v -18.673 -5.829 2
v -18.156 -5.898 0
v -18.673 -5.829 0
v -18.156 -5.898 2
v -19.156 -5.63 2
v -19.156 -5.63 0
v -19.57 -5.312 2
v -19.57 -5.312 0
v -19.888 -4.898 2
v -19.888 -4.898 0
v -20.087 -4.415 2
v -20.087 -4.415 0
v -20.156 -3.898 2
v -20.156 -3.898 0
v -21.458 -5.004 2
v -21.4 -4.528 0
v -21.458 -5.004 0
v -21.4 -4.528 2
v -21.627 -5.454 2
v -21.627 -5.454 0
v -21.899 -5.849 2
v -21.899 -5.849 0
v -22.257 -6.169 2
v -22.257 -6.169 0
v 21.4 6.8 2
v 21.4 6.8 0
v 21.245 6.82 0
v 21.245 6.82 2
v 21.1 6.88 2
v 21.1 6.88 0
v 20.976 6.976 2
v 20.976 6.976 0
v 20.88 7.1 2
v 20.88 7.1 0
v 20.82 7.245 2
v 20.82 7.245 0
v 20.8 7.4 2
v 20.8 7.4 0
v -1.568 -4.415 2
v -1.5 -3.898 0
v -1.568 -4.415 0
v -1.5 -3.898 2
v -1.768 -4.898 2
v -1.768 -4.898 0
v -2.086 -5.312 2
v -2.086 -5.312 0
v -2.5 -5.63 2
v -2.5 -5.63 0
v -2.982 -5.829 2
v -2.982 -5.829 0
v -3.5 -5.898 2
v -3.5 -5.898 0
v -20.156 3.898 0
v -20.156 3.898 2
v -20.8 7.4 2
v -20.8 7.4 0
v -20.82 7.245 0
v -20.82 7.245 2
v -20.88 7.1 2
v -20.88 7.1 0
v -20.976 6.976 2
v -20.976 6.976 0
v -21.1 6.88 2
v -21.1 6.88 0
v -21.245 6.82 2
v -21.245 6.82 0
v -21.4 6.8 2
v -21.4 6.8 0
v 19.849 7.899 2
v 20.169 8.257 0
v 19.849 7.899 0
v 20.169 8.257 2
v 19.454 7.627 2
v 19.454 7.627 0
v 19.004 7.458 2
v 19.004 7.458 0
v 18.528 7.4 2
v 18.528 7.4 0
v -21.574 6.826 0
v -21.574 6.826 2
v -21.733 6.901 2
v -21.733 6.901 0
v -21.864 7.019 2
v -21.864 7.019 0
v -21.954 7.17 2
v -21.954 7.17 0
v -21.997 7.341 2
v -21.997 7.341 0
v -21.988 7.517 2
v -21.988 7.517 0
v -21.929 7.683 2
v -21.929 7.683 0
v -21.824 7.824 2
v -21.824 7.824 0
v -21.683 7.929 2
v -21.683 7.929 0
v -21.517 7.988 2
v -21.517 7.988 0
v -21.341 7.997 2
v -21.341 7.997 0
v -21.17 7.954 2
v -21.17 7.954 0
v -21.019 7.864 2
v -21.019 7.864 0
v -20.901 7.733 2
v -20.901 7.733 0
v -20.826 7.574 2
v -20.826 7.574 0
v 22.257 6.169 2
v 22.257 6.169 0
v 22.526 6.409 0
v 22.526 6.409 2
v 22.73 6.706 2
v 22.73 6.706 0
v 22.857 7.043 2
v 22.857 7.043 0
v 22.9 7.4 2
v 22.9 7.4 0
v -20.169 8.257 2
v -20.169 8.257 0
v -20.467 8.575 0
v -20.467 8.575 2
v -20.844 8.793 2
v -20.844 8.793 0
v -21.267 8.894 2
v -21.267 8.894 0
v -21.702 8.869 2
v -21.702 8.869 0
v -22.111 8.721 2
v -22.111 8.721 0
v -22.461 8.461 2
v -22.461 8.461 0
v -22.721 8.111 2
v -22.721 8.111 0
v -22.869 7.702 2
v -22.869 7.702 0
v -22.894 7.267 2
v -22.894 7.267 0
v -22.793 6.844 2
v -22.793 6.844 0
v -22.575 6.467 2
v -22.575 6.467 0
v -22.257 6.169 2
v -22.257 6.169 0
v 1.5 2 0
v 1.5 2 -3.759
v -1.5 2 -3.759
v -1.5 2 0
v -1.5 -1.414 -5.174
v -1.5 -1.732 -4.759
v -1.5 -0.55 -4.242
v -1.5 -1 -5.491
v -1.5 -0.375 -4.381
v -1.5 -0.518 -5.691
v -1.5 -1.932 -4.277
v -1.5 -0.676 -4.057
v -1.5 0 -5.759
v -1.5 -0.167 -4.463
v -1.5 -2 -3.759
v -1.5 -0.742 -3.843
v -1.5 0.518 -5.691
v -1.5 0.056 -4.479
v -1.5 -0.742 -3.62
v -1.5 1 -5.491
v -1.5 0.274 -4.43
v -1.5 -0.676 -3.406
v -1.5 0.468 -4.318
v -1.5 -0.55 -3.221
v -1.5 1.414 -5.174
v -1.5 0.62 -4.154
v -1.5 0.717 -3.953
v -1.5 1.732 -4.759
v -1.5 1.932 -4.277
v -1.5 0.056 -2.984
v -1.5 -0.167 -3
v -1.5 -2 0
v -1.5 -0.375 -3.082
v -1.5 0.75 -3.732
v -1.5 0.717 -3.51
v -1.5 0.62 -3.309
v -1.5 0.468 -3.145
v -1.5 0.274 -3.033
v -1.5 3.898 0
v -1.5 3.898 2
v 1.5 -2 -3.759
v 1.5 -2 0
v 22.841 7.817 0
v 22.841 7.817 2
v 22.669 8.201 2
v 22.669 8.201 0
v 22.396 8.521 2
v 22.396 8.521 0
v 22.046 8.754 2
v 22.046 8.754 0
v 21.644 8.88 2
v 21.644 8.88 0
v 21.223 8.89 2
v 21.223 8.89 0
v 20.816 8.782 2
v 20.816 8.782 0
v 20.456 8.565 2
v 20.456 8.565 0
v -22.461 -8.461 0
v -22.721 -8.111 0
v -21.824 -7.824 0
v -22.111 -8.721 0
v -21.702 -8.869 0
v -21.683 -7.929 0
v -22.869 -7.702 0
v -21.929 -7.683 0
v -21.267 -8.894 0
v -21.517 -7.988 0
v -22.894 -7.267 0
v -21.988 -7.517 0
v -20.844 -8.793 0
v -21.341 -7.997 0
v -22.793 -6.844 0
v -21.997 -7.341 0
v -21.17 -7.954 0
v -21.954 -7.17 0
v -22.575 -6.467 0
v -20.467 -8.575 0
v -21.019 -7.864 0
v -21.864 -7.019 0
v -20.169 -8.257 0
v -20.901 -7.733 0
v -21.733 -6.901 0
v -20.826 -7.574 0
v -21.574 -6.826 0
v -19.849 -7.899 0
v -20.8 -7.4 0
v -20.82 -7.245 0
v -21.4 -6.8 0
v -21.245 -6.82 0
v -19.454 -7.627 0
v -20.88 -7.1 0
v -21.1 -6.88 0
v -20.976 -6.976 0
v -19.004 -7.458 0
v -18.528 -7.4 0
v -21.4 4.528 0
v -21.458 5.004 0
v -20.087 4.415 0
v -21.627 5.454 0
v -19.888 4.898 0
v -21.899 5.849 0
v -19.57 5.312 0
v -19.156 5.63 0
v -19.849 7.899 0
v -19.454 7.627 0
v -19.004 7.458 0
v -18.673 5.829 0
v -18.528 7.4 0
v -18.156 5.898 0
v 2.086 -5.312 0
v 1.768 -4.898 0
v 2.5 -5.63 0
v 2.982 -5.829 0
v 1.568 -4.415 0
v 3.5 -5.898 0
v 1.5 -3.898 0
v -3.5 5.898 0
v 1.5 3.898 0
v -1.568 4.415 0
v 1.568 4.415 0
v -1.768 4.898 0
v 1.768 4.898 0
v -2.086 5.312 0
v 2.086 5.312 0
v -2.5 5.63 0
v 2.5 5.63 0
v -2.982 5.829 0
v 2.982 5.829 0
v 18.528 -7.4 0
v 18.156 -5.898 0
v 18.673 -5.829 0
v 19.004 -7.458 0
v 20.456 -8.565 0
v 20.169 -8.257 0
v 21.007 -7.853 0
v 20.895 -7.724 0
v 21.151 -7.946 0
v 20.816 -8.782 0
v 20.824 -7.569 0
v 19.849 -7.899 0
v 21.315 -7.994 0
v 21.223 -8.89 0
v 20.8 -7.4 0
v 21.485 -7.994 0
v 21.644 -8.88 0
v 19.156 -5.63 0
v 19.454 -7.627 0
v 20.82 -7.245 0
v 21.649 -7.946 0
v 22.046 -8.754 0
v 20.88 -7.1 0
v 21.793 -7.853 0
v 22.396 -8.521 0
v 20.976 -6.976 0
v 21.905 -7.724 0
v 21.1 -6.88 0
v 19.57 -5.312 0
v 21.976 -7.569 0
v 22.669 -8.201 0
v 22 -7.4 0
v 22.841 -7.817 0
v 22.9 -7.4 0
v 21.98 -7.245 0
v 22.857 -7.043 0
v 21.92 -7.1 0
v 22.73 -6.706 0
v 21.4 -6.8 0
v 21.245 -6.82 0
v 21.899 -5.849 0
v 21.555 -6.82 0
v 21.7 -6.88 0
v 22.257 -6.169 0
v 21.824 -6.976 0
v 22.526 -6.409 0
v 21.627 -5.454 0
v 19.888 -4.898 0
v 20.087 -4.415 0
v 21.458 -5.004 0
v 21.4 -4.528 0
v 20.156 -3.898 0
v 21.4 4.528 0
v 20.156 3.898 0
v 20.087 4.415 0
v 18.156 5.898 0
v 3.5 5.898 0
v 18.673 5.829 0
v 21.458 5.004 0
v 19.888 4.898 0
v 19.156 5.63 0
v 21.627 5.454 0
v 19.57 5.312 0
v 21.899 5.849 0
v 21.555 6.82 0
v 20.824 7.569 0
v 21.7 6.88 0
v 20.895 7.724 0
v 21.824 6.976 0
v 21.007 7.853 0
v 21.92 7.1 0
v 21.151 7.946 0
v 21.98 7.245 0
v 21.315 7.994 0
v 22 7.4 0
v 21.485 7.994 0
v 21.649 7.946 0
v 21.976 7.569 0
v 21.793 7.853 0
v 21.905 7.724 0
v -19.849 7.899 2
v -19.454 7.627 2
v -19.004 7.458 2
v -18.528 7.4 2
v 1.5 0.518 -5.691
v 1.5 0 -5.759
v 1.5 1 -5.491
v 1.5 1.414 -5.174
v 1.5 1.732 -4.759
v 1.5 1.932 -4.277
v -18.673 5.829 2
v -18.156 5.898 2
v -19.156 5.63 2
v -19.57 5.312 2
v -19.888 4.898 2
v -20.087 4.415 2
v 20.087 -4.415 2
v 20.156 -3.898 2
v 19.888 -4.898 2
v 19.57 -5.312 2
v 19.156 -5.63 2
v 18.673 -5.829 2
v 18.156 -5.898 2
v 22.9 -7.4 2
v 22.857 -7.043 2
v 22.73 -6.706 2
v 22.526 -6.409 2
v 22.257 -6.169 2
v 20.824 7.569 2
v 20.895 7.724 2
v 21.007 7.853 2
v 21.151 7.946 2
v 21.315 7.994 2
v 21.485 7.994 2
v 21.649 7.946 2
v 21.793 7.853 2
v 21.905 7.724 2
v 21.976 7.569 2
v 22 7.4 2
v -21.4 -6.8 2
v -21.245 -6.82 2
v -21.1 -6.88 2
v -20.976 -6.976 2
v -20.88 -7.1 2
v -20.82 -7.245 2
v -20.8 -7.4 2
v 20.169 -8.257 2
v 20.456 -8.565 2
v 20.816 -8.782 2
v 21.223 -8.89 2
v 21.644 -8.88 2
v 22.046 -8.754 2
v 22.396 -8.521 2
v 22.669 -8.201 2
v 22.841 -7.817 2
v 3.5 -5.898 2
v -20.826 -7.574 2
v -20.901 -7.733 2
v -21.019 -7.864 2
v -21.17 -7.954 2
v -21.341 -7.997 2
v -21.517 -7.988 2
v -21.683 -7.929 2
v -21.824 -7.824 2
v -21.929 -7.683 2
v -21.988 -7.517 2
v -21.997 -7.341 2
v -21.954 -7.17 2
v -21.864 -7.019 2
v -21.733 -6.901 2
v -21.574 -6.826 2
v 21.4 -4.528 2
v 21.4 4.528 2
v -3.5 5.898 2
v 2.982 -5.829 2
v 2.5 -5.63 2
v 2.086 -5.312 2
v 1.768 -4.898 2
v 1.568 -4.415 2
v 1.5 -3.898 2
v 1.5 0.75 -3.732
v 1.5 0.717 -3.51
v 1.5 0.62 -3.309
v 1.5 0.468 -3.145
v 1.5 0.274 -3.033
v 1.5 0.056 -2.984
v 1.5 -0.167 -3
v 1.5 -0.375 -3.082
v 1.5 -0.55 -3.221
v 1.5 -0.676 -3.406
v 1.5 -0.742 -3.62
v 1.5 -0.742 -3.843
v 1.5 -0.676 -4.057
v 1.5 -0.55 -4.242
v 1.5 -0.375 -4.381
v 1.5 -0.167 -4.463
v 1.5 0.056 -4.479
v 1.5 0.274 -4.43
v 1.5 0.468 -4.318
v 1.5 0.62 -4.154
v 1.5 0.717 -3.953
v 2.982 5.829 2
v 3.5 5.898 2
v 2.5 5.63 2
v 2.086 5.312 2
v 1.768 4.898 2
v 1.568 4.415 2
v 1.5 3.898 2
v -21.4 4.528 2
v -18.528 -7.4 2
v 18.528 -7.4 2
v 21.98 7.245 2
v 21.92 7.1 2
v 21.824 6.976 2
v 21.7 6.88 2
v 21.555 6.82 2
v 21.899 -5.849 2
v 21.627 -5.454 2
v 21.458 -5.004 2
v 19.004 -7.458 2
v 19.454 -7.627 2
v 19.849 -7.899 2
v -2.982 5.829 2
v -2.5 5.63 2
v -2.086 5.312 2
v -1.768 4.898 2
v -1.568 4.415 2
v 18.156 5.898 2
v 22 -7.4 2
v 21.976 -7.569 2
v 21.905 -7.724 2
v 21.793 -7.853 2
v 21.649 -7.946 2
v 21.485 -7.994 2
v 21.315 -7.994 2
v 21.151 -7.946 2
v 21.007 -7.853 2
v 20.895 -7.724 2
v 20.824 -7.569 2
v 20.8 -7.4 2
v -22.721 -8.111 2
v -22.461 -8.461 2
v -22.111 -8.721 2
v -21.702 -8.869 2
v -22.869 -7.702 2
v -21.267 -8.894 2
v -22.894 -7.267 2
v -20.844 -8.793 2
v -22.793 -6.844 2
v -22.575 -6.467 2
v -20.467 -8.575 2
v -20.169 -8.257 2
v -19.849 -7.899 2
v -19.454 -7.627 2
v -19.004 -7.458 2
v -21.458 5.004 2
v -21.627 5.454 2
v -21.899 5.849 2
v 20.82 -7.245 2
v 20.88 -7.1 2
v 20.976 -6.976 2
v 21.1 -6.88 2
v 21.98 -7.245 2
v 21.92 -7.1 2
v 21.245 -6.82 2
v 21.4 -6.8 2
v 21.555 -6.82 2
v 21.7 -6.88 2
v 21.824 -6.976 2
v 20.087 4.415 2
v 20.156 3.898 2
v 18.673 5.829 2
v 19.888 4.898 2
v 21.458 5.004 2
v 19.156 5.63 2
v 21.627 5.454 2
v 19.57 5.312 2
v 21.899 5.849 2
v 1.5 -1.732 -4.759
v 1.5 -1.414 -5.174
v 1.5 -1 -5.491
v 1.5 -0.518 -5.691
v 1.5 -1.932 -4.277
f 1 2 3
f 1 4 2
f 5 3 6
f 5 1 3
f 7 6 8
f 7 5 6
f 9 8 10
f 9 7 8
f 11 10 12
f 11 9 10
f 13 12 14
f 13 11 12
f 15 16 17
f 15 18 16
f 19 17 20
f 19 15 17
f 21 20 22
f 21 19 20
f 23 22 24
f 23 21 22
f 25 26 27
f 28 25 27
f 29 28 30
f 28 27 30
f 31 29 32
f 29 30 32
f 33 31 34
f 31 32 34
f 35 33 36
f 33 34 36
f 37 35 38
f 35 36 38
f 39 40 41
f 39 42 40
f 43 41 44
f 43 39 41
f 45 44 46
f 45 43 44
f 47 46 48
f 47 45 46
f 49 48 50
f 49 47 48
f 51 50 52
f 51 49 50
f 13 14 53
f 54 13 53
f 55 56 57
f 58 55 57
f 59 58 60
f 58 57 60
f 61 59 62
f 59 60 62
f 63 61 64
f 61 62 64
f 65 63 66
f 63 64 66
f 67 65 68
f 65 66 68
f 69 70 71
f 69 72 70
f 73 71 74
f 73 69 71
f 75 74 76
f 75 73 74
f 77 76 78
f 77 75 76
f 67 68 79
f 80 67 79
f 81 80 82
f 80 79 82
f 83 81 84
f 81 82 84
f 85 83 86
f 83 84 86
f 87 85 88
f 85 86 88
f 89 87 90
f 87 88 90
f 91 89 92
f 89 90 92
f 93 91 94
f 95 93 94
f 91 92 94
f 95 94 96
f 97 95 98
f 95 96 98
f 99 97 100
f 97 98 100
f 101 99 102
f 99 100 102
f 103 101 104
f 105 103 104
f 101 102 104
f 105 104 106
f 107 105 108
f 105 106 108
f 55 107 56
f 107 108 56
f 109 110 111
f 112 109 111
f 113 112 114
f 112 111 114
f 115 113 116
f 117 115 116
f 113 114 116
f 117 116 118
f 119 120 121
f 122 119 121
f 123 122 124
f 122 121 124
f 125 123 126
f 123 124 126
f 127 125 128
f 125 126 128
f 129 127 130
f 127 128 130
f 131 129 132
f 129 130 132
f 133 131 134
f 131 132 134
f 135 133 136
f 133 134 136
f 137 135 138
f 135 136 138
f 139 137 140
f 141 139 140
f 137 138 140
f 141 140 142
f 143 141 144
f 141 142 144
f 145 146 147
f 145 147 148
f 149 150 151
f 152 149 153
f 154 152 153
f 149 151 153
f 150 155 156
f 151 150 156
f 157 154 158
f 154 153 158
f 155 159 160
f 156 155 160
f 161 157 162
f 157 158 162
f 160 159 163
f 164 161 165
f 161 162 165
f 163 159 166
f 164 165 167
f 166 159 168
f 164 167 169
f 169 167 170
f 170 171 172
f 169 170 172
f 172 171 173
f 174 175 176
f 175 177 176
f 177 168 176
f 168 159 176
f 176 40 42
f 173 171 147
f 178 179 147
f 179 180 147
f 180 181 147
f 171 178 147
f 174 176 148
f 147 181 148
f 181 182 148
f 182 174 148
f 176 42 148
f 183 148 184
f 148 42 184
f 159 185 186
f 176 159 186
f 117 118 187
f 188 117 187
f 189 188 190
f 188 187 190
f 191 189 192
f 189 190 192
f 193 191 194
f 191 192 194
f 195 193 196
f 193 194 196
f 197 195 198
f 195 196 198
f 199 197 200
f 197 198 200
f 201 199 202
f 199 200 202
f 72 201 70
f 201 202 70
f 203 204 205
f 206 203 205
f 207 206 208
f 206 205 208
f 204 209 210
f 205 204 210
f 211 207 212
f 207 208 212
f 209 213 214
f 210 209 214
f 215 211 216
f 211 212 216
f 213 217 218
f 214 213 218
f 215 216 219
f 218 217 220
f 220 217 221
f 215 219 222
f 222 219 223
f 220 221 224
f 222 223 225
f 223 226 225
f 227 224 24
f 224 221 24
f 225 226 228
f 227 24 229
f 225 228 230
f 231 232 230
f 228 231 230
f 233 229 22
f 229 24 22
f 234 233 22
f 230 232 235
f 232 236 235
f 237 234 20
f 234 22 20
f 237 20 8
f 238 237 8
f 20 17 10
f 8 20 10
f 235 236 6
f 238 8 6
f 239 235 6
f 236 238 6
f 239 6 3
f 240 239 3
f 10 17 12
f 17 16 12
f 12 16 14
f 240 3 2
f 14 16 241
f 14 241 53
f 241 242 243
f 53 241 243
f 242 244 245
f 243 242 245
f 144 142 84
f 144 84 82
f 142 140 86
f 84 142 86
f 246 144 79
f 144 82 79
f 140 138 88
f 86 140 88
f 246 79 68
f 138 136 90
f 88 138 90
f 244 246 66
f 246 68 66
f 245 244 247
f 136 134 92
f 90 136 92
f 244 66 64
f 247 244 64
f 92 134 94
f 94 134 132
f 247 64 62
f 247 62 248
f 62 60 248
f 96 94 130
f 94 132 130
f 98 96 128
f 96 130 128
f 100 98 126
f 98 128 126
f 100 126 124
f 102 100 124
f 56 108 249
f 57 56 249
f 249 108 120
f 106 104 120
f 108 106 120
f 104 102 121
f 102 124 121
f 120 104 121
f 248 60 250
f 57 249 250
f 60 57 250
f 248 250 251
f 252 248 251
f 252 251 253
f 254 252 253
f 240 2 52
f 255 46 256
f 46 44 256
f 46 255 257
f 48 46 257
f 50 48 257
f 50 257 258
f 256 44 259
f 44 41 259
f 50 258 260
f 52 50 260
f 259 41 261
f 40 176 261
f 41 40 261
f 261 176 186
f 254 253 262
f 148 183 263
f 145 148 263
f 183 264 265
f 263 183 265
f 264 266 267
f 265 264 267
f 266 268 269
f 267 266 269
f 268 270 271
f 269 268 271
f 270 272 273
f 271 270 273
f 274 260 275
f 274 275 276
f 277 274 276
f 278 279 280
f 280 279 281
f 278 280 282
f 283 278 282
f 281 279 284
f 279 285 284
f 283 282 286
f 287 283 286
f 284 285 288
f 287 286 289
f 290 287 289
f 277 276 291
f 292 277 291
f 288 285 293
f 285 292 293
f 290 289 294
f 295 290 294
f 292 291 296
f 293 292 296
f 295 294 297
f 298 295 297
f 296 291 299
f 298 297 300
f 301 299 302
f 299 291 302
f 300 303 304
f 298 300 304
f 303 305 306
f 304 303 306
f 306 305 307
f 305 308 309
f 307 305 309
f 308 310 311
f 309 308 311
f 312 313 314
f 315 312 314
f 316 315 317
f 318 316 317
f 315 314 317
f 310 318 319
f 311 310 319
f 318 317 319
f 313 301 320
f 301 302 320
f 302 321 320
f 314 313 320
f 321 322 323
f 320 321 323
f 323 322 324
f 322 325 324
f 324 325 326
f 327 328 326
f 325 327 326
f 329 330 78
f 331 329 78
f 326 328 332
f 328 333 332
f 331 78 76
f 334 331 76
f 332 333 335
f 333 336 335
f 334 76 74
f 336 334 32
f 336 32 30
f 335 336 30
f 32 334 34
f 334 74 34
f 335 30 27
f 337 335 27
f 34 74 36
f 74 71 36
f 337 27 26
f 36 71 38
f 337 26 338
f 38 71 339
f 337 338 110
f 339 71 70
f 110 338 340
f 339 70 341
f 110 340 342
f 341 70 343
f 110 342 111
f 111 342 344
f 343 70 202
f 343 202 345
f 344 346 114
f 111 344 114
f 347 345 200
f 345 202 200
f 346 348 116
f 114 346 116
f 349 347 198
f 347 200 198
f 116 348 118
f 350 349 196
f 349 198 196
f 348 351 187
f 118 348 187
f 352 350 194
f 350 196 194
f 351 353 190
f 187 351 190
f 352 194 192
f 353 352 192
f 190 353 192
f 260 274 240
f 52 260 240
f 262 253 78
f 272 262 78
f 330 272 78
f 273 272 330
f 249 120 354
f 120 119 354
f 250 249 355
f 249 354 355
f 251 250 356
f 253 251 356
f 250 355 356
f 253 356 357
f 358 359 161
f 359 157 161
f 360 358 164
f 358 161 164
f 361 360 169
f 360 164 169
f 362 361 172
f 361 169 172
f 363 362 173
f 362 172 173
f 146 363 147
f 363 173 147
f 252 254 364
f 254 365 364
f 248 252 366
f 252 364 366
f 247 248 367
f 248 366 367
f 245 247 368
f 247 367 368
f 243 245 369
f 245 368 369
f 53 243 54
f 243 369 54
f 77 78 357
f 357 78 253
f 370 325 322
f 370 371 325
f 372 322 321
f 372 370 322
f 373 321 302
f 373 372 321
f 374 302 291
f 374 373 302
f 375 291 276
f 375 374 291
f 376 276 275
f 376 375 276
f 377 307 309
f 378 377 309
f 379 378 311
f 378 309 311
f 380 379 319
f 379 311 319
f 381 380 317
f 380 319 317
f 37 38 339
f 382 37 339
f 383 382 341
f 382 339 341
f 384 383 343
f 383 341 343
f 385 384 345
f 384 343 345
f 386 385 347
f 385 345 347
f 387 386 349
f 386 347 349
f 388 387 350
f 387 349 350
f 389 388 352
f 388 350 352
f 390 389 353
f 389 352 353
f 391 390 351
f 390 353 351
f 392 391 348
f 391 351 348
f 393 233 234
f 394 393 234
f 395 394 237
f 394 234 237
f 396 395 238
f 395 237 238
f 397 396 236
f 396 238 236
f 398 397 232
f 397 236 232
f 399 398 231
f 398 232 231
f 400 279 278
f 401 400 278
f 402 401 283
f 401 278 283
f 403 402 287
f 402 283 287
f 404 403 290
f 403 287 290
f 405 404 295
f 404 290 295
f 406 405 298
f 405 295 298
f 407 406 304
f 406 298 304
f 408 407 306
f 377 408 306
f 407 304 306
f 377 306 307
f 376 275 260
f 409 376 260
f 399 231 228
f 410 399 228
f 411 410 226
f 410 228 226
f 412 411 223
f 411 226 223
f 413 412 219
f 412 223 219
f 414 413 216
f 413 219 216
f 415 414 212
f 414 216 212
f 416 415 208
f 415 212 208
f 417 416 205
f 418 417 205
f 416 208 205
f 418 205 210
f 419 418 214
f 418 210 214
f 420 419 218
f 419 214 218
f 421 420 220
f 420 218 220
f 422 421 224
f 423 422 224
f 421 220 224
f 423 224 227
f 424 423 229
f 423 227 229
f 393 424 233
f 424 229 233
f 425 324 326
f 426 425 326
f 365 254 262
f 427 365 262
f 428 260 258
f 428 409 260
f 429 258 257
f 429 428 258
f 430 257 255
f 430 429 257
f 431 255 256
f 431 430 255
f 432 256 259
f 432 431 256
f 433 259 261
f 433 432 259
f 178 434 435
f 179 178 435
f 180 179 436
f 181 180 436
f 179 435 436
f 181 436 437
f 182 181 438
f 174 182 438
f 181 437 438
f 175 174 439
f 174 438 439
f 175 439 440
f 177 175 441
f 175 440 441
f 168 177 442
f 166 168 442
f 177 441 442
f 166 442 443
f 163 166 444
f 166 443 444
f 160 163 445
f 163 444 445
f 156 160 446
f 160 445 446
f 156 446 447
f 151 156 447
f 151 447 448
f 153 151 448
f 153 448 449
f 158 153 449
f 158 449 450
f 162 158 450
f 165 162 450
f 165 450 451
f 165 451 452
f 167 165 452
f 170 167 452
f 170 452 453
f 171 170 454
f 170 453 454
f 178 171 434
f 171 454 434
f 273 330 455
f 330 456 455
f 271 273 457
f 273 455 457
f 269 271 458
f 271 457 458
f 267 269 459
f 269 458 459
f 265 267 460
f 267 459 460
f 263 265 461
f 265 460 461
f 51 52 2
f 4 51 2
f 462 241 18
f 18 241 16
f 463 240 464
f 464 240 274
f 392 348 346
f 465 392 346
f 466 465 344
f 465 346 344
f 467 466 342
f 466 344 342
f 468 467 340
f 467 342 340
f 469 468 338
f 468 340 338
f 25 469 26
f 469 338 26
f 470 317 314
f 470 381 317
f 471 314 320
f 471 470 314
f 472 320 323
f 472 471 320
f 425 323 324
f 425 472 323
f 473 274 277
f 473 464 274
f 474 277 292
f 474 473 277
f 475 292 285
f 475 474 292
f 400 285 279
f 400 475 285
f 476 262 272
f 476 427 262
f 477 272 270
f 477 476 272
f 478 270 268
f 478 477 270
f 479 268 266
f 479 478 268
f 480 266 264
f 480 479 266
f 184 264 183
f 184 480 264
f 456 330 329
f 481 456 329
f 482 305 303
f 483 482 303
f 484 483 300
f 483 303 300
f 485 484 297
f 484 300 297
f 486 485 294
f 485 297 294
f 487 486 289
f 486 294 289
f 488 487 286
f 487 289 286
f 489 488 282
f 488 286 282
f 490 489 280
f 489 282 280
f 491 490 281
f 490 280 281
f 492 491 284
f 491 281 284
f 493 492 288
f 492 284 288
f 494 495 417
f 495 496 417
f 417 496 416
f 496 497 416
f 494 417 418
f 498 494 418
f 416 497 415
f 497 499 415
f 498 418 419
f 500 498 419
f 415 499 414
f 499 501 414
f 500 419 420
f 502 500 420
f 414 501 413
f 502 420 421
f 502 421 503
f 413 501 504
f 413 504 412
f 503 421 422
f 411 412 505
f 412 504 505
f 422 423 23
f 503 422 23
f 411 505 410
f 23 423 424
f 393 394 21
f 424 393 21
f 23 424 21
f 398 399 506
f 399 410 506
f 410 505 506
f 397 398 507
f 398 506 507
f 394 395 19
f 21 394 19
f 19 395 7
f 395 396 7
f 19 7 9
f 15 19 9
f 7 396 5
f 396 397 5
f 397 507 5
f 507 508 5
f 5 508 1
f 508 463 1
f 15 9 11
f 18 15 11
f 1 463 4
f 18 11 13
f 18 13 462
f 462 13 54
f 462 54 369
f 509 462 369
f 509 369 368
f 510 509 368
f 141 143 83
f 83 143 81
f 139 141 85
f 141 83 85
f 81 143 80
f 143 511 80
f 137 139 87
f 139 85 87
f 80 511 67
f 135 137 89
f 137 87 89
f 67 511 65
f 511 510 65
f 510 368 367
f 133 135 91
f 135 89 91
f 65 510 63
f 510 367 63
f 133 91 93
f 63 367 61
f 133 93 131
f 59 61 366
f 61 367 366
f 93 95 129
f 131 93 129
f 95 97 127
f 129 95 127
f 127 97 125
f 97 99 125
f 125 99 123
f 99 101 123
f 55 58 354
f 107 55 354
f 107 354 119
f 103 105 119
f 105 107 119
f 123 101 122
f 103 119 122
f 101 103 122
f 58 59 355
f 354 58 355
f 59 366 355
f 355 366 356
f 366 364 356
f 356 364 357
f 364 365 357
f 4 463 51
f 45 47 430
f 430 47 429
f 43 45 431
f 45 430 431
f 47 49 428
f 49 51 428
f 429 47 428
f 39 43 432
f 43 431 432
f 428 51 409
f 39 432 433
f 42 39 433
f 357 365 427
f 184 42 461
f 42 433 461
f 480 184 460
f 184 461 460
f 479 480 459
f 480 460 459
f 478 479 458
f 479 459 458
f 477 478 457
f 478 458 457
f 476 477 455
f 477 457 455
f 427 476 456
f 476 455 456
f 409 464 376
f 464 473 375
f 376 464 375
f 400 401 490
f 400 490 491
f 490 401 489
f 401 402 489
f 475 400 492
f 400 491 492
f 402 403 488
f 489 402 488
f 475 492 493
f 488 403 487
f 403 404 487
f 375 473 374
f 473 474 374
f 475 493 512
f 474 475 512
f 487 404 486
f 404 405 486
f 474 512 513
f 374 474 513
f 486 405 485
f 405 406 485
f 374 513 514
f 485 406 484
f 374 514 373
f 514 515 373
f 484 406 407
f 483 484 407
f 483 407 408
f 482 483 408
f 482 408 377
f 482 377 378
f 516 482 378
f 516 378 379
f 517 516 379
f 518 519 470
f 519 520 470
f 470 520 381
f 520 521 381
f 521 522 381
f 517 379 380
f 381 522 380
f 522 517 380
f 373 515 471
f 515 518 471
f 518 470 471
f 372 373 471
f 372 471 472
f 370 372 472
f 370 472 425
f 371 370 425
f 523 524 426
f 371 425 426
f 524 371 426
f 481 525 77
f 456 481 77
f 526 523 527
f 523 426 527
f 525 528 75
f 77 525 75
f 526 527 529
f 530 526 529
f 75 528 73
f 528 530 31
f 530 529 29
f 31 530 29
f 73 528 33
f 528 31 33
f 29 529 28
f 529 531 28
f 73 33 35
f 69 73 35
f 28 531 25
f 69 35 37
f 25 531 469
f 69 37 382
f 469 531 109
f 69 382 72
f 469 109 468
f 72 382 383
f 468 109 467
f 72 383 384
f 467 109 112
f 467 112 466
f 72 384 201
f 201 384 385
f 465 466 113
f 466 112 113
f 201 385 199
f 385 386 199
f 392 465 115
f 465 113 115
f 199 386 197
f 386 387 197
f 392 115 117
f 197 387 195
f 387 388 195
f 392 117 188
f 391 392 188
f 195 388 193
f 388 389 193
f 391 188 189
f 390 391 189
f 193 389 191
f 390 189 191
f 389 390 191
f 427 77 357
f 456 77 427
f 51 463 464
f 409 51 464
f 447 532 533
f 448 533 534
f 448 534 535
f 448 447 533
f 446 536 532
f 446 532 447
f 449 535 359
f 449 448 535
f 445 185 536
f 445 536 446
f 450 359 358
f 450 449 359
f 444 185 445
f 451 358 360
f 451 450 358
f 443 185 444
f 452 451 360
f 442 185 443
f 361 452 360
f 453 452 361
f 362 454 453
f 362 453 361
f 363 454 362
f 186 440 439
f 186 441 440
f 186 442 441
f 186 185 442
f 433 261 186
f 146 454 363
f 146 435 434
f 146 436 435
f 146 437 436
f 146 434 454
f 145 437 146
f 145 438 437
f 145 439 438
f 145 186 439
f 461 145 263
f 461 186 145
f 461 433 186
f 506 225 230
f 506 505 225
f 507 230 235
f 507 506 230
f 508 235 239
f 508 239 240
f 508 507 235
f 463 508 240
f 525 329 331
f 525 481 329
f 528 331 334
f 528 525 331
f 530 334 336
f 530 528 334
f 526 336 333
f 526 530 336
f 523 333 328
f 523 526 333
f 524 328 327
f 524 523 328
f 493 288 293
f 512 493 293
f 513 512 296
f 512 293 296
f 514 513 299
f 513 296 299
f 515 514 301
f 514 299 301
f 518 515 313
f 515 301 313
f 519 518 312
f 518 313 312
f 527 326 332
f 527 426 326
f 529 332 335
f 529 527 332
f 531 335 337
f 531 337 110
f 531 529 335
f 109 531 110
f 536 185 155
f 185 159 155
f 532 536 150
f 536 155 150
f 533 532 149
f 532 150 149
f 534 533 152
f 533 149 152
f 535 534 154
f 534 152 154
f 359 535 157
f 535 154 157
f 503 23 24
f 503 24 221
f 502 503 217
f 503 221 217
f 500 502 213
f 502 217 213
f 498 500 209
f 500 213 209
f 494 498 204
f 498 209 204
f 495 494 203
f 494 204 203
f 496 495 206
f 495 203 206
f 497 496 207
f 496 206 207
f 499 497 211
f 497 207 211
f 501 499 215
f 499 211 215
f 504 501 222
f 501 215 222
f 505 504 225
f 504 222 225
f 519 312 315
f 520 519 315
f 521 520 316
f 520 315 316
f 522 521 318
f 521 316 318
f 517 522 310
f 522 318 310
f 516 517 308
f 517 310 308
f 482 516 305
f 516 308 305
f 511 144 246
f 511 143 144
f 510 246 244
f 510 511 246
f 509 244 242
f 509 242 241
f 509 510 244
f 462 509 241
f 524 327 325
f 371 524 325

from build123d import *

# Parameters (mm, degrees)
F0_W     = 3
F0_H     = 0.7113954189
F0_H_2   = 11.7951147258
F1_DEPTH = 2
F2_R     = 2
F3_W     = 4
F3_H     = 7.7592988014
F3_R     = 0.75
F4_DEPTH = 3
F5_R     = 1.99999


# Not quite as in the source:
# - a fillet or chamfer is up to 0.001 mm smaller than in the source, because OpenCascade refuses the exact size


with BuildPart() as f1:
    # F0 (on Top) → F1 (new body)
    with BuildSketch(Plane.XY):
        with BuildLine():
            ThreePointArc((-21.4, 5.9), (-20.3393398282, 6.3393398282), (-19.9, 7.4))
            Line((-19.9, 7.4), (-20.8, 7.4))
            ThreePointArc((-20.8, 7.4), (-20.9757359313, 6.9757359313), (-21.4, 6.8))
            Line((-21.4, 6.8), (-21.4, 5.9))
        make_face()
        with BuildLine():
            Line((-20.8, 7.4), (-19.9, 7.4))
            ThreePointArc((-19.9, 7.4), (-22.4606601718, 8.4606601718), (-21.4, 5.9))
            Line((-21.4, 5.9), (-21.4, 6.8))
            ThreePointArc((-21.4, 6.8), (-21.8242640687, 7.8242640687), (-20.8, 7.4))
        make_face()
        with BuildLine():
            Line((19.9, 7.4), (-19.9, 7.4))
            ThreePointArc((-19.9, 7.4), (-20.3393398282, 6.3393398282), (-21.4, 5.9))
            Line((-21.4, 5.9), (-21.4, -5.9))
            ThreePointArc((-21.4, -5.9), (-20.3393398282, -6.3393398282), (-19.9, -7.4))
            Line((-19.9, -7.4), (19.9, -7.4))
            ThreePointArc((19.9, -7.4), (20.0395252165, -6.7682497618), (20.4321444846, -6.2540263086))
            Line((20.4321444846, -6.2540263086), (20.4321444846, 6.2540263086))
            ThreePointArc((20.4321444846, 6.2540263086), (20.0395252165, 6.7682497618), (19.9, 7.4))
        make_face()
        Polygon((-1.5, 5.8975573629), (-1.5, 6.6089527819), (1.5, 6.6089527819), (1.5, 5.8975573629), (20.1555918902, 5.8975573629), (20.1555918902, -5.8975573629), (1.5, -5.8975573629), (1.5, -6.6089527819), (-1.5, -6.6089527819), (-1.5, -5.8975573629), (-20.1555918902, -5.8975573629), (-20.1555918902, 5.8975573629), align=None, mode=Mode.SUBTRACT)
        with BuildLine():
            ThreePointArc((22.9, 7.4), (21.4, 8.9), (19.9, 7.4))
            Line((19.9, 7.4), (20.8, 7.4))
            ThreePointArc((20.8, 7.4), (21.4, 8), (22, 7.4))
            ThreePointArc((22, 7.4), (21.8242640687, 6.9757359313), (21.4, 6.8))
            Line((21.4, 6.8), (21.4, 5.9))
            ThreePointArc((21.4, 5.9), (22.4606601718, 6.3393398282), (22.9, 7.4))
        make_face()
        with BuildLine():
            Line((20.8, 7.4), (19.9, 7.4))
            ThreePointArc((19.9, 7.4), (20.0395252165, 6.7682497618), (20.4321444846, 6.2540263086))
            ThreePointArc((20.4321444846, 6.2540263086), (20.8847139324, 5.9912841775), (21.4, 5.9))
            Line((21.4, 5.9), (21.4, 6.8))
            ThreePointArc((21.4, 6.8), (20.9757359313, 6.9757359313), (20.8, 7.4))
        make_face()
        with BuildLine():
            ThreePointArc((21.4, 5.9), (20.8847139324, 5.9912841775), (20.4321444846, 6.2540263086))
            Line((20.4321444846, 6.2540263086), (20.4321444846, -6.2540263086))
            ThreePointArc((20.4321444846, -6.2540263086), (20.8847139324, -5.9912841775), (21.4, -5.9))
            Line((21.4, -5.9), (21.4, 5.9))
        make_face()
        with BuildLine():
            ThreePointArc((-19.9, -7.4), (-20.3393398282, -6.3393398282), (-21.4, -5.9))
            Line((-21.4, -5.9), (-21.4, -6.8))
            ThreePointArc((-21.4, -6.8), (-20.9757359313, -6.9757359313), (-20.8, -7.4))
            Line((-20.8, -7.4), (-19.9, -7.4))
        make_face()
        with BuildLine():
            Line((-21.4, -6.8), (-21.4, -5.9))
            ThreePointArc((-21.4, -5.9), (-22.4606601718, -8.4606601718), (-19.9, -7.4))
            Line((-19.9, -7.4), (-20.8, -7.4))
            ThreePointArc((-20.8, -7.4), (-21.8242640687, -7.8242640687), (-21.4, -6.8))
        make_face()
        with BuildLine():
            ThreePointArc((21.4, -5.9), (20.8847139324, -5.9912841775), (20.4321444846, -6.2540263086))
            ThreePointArc((20.4321444846, -6.2540263086), (20.0395252165, -6.7682497618), (19.9, -7.4))
            Line((19.9, -7.4), (20.8, -7.4))
            ThreePointArc((20.8, -7.4), (20.9757359313, -6.9757359313), (21.4, -6.8))
            Line((21.4, -6.8), (21.4, -5.9))
        make_face()
        with BuildLine():
            ThreePointArc((22.9, -7.4), (22.4606601718, -6.3393398282), (21.4, -5.9))
            Line((21.4, -5.9), (21.4, -6.8))
            ThreePointArc((21.4, -6.8), (21.8242640687, -6.9757359313), (22, -7.4))
            ThreePointArc((22, -7.4), (21.4, -8), (20.8, -7.4))
            Line((20.8, -7.4), (19.9, -7.4))
            ThreePointArc((19.9, -7.4), (21.4, -8.9), (22.9, -7.4))
        make_face()
        with Locations((0, 6.2532550724)):
            Rectangle(F0_W, F0_H)
        with Locations((0, -6.2532550724)):
            Rectangle(F0_W, F0_H)
        Rectangle(F0_W, F0_H_2)
    extrude(amount=F1_DEPTH)

    # F2
    f2_edges = [f1.edges().sort_by_distance(p)[0] for p in [
        (-19.9, 7.4, 1),
        (-19.9, -7.4, 1),
        (-1.5, -5.897557, 1),
        (-20.155592, -5.897557, 1),
        (-20.155592, 5.897557, 1),
        (20.155592, 5.897557, 1),
        (20.155592, -5.897557, 1),
        (1.5, 5.897557, 1),
        (-1.5, 5.897557, 1),
        (1.5, -5.897557, 1),
        (-21.4, 5.9, 1),
        (-21.4, -5.9, 1),
        (19.9, -7.4, 1),
        (21.4, -5.9, 1),
        (21.4, 5.9, 1),
        (19.9, 7.4, 1),
    ]]
    fillet(f2_edges, radius=F2_R)

    # F3 (on face) → F4 (join, through all)
    with BuildSketch(Plane.YZ.offset(1.5)):
        with Locations((0, -1.8796494007)):
            Rectangle(F3_W, F3_H)
        with Locations((0, -3.7315103691)):
            Circle(F3_R, mode=Mode.SUBTRACT)
    extrude(amount=-F4_DEPTH)

    # F5 (radius 2 in the source; OpenCascade refuses exactly that, so slightly less here)
    f5_edges = [f1.edges().sort_by_distance(p)[0] for p in [
        (0, 2, -5.759299),
        (0, -2, -5.759299),
    ]]
    fillet(f5_edges, radius=F5_R)


solid = f1.part
